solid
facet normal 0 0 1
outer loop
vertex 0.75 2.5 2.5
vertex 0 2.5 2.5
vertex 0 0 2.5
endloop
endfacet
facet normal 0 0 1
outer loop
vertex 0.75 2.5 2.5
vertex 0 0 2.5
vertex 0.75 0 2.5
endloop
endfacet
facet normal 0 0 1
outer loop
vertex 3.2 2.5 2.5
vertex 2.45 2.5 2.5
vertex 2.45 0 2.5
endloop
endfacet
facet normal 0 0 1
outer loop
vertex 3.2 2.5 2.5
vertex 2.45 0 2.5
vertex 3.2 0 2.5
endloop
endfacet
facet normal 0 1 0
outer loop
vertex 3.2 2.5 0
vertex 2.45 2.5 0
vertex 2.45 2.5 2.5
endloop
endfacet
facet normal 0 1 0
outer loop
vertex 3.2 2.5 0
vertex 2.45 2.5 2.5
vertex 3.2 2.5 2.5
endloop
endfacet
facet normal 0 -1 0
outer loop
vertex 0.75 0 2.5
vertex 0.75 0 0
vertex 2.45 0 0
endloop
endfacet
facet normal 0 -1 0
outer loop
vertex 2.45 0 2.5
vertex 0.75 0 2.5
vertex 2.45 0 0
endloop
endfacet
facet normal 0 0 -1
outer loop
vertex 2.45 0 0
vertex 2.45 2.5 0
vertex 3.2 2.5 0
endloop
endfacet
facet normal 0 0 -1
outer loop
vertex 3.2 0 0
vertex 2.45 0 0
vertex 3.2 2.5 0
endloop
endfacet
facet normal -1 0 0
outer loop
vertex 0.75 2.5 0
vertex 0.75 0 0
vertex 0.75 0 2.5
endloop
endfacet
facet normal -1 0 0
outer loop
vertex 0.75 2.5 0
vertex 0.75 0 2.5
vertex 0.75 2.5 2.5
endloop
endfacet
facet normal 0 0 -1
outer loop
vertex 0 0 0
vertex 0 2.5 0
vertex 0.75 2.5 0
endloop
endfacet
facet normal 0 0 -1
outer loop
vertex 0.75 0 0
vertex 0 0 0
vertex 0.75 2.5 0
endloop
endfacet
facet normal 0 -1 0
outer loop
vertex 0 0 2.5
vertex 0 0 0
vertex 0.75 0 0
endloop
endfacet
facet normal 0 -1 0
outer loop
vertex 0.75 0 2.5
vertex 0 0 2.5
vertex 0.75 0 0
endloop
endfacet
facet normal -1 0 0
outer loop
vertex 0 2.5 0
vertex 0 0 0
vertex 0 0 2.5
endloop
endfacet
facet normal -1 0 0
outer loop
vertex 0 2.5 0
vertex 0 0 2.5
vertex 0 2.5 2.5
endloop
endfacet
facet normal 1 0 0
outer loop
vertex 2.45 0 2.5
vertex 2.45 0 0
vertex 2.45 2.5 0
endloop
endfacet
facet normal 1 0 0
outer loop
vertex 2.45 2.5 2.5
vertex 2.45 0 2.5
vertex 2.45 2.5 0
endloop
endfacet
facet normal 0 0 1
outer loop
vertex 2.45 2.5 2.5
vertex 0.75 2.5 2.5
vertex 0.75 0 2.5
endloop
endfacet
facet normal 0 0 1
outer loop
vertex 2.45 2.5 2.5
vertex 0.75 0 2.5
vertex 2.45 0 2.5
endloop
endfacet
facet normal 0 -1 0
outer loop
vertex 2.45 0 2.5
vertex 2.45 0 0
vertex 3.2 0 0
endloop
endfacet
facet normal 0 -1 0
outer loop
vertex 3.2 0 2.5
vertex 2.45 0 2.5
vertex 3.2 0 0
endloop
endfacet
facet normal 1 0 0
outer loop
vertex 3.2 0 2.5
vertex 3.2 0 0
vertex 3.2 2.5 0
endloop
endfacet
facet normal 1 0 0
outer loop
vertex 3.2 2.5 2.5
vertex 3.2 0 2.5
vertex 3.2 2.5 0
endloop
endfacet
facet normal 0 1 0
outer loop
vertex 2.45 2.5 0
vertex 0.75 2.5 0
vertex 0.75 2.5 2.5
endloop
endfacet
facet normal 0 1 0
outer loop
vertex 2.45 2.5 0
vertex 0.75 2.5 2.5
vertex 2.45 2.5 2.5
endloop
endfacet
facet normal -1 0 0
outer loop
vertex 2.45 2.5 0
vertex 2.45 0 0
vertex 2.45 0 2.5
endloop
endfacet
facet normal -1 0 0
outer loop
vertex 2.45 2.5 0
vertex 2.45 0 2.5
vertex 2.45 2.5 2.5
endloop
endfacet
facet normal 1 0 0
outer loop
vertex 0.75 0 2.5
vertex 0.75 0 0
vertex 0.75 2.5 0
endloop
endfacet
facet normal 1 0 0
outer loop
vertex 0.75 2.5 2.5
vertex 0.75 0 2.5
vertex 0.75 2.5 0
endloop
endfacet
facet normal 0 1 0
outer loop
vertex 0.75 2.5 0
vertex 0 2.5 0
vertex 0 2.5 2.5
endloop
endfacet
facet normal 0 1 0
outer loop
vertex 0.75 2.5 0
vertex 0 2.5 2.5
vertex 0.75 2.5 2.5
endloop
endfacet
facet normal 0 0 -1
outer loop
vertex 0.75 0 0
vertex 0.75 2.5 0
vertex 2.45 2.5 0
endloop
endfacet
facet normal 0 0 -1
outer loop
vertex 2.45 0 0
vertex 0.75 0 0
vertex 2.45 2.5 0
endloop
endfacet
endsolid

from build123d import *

# Parameters (mm, degrees)
BOX_W        = 0.75
BOX_H        = 2.5
BOX_DEPTH    = 2.5
BOX001_W     = 1.7
BOX001_H     = 2.5
BOX001_DEPTH = 2.5
BOX002_W     = 0.75
BOX002_H     = 2.5
BOX002_DEPTH = 2.5


with BuildPart() as pad001:
    # Box → Box (new body)
    with BuildSketch(Plane.XY):
        with Locations((0.375, 1.25)):
            Rectangle(BOX_W, BOX_H)
    extrude(amount=BOX_DEPTH)


with BuildPart() as corpo:
    # Box001 → Box001 (new body)
    with BuildSketch(Plane(origin=(0.75, 0, 0), x_dir=(1, 0, 0), z_dir=(0, 0, 1))):
        with Locations((0.85, 1.25)):
            Rectangle(BOX001_W, BOX001_H)
    extrude(amount=BOX001_DEPTH)


with BuildPart() as pad002:
    # Box002 → Box002 (new body)
    with BuildSketch(Plane(origin=(2.45, 0, 0), x_dir=(1, 0, 0), z_dir=(0, 0, 1))):
        with Locations((0.375, 1.25)):
            Rectangle(BOX002_W, BOX002_H)
    extrude(amount=BOX002_DEPTH)


solid = Compound([pad001.part, corpo.part, pad002.part])
